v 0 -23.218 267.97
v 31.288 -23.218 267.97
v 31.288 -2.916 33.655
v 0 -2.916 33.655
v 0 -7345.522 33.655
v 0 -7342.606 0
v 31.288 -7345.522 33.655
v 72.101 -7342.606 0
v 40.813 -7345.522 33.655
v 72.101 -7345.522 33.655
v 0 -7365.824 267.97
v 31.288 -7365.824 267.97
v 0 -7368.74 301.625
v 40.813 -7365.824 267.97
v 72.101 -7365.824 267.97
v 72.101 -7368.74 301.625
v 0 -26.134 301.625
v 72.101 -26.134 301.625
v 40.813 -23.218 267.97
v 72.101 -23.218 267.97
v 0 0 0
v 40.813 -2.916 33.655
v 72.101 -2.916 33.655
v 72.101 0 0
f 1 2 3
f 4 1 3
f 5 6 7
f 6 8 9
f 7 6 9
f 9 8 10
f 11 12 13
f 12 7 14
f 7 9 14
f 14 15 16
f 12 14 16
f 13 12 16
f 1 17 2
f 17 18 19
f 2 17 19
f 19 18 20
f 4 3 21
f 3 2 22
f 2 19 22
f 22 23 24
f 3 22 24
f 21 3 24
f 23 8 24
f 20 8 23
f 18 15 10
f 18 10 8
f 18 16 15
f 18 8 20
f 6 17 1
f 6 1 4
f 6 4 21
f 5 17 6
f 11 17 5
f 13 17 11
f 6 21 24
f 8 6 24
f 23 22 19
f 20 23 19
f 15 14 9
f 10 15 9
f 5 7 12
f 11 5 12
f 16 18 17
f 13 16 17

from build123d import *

# Parameters (mm, degrees)
F1_DEPTH = 7620
F3_DEPTH = 72.10199
F5_DEPTH = 31.287995
F7_DEPTH = 31.287995


with BuildPart() as f1:
    # F0 (on Front) → F1 (new body)
    with BuildSketch(Plane.XZ):
        Polygon((0, 33.655), (0, 0), (72.10099, 0), (72.10099, 33.655), (40.812995, 33.655), (40.812995, 267.97), (72.10099, 267.97), (72.10099, 301.625), (0, 301.625), (0, 267.97), (31.287995, 267.97), (31.287995, 33.655), align=None)
    extrude(amount=F1_DEPTH)

    # F2 (on face) → F3 (cut, through all)
    with BuildSketch(Plane.YZ.offset(72.10099)):
        Polygon((-7620, 0), (-7342.606046, 0), (-7368.73962, 301.625), (-7620, 301.625), align=None)
        Polygon((-26.133574, 301.625), (0, 0), (0, 301.625), align=None)
    extrude(amount=-F3_DEPTH, mode=Mode.SUBTRACT)

    # F4 (on face) → F5 (join, through all)
    with BuildSketch(Plane.YZ.offset(40.812995)):
        Polygon((-23.217617, 267.97), (-7365.823663, 267.97), (-7345.522003, 33.655), (-2.915957, 33.655), align=None)
    extrude(amount=F5_DEPTH)

    # F6 (on face) → F7 (join, through all)
    with BuildSketch(Plane(origin=(31.287995, 0, 0), x_dir=(0, -1, 0), z_dir=(-1, 0, 0))):
        Polygon((23.217617, 267.97), (2.915957, 33.655), (7345.522003, 33.655), (7365.823663, 267.97), align=None)
    extrude(amount=F7_DEPTH)


solid = f1.part
